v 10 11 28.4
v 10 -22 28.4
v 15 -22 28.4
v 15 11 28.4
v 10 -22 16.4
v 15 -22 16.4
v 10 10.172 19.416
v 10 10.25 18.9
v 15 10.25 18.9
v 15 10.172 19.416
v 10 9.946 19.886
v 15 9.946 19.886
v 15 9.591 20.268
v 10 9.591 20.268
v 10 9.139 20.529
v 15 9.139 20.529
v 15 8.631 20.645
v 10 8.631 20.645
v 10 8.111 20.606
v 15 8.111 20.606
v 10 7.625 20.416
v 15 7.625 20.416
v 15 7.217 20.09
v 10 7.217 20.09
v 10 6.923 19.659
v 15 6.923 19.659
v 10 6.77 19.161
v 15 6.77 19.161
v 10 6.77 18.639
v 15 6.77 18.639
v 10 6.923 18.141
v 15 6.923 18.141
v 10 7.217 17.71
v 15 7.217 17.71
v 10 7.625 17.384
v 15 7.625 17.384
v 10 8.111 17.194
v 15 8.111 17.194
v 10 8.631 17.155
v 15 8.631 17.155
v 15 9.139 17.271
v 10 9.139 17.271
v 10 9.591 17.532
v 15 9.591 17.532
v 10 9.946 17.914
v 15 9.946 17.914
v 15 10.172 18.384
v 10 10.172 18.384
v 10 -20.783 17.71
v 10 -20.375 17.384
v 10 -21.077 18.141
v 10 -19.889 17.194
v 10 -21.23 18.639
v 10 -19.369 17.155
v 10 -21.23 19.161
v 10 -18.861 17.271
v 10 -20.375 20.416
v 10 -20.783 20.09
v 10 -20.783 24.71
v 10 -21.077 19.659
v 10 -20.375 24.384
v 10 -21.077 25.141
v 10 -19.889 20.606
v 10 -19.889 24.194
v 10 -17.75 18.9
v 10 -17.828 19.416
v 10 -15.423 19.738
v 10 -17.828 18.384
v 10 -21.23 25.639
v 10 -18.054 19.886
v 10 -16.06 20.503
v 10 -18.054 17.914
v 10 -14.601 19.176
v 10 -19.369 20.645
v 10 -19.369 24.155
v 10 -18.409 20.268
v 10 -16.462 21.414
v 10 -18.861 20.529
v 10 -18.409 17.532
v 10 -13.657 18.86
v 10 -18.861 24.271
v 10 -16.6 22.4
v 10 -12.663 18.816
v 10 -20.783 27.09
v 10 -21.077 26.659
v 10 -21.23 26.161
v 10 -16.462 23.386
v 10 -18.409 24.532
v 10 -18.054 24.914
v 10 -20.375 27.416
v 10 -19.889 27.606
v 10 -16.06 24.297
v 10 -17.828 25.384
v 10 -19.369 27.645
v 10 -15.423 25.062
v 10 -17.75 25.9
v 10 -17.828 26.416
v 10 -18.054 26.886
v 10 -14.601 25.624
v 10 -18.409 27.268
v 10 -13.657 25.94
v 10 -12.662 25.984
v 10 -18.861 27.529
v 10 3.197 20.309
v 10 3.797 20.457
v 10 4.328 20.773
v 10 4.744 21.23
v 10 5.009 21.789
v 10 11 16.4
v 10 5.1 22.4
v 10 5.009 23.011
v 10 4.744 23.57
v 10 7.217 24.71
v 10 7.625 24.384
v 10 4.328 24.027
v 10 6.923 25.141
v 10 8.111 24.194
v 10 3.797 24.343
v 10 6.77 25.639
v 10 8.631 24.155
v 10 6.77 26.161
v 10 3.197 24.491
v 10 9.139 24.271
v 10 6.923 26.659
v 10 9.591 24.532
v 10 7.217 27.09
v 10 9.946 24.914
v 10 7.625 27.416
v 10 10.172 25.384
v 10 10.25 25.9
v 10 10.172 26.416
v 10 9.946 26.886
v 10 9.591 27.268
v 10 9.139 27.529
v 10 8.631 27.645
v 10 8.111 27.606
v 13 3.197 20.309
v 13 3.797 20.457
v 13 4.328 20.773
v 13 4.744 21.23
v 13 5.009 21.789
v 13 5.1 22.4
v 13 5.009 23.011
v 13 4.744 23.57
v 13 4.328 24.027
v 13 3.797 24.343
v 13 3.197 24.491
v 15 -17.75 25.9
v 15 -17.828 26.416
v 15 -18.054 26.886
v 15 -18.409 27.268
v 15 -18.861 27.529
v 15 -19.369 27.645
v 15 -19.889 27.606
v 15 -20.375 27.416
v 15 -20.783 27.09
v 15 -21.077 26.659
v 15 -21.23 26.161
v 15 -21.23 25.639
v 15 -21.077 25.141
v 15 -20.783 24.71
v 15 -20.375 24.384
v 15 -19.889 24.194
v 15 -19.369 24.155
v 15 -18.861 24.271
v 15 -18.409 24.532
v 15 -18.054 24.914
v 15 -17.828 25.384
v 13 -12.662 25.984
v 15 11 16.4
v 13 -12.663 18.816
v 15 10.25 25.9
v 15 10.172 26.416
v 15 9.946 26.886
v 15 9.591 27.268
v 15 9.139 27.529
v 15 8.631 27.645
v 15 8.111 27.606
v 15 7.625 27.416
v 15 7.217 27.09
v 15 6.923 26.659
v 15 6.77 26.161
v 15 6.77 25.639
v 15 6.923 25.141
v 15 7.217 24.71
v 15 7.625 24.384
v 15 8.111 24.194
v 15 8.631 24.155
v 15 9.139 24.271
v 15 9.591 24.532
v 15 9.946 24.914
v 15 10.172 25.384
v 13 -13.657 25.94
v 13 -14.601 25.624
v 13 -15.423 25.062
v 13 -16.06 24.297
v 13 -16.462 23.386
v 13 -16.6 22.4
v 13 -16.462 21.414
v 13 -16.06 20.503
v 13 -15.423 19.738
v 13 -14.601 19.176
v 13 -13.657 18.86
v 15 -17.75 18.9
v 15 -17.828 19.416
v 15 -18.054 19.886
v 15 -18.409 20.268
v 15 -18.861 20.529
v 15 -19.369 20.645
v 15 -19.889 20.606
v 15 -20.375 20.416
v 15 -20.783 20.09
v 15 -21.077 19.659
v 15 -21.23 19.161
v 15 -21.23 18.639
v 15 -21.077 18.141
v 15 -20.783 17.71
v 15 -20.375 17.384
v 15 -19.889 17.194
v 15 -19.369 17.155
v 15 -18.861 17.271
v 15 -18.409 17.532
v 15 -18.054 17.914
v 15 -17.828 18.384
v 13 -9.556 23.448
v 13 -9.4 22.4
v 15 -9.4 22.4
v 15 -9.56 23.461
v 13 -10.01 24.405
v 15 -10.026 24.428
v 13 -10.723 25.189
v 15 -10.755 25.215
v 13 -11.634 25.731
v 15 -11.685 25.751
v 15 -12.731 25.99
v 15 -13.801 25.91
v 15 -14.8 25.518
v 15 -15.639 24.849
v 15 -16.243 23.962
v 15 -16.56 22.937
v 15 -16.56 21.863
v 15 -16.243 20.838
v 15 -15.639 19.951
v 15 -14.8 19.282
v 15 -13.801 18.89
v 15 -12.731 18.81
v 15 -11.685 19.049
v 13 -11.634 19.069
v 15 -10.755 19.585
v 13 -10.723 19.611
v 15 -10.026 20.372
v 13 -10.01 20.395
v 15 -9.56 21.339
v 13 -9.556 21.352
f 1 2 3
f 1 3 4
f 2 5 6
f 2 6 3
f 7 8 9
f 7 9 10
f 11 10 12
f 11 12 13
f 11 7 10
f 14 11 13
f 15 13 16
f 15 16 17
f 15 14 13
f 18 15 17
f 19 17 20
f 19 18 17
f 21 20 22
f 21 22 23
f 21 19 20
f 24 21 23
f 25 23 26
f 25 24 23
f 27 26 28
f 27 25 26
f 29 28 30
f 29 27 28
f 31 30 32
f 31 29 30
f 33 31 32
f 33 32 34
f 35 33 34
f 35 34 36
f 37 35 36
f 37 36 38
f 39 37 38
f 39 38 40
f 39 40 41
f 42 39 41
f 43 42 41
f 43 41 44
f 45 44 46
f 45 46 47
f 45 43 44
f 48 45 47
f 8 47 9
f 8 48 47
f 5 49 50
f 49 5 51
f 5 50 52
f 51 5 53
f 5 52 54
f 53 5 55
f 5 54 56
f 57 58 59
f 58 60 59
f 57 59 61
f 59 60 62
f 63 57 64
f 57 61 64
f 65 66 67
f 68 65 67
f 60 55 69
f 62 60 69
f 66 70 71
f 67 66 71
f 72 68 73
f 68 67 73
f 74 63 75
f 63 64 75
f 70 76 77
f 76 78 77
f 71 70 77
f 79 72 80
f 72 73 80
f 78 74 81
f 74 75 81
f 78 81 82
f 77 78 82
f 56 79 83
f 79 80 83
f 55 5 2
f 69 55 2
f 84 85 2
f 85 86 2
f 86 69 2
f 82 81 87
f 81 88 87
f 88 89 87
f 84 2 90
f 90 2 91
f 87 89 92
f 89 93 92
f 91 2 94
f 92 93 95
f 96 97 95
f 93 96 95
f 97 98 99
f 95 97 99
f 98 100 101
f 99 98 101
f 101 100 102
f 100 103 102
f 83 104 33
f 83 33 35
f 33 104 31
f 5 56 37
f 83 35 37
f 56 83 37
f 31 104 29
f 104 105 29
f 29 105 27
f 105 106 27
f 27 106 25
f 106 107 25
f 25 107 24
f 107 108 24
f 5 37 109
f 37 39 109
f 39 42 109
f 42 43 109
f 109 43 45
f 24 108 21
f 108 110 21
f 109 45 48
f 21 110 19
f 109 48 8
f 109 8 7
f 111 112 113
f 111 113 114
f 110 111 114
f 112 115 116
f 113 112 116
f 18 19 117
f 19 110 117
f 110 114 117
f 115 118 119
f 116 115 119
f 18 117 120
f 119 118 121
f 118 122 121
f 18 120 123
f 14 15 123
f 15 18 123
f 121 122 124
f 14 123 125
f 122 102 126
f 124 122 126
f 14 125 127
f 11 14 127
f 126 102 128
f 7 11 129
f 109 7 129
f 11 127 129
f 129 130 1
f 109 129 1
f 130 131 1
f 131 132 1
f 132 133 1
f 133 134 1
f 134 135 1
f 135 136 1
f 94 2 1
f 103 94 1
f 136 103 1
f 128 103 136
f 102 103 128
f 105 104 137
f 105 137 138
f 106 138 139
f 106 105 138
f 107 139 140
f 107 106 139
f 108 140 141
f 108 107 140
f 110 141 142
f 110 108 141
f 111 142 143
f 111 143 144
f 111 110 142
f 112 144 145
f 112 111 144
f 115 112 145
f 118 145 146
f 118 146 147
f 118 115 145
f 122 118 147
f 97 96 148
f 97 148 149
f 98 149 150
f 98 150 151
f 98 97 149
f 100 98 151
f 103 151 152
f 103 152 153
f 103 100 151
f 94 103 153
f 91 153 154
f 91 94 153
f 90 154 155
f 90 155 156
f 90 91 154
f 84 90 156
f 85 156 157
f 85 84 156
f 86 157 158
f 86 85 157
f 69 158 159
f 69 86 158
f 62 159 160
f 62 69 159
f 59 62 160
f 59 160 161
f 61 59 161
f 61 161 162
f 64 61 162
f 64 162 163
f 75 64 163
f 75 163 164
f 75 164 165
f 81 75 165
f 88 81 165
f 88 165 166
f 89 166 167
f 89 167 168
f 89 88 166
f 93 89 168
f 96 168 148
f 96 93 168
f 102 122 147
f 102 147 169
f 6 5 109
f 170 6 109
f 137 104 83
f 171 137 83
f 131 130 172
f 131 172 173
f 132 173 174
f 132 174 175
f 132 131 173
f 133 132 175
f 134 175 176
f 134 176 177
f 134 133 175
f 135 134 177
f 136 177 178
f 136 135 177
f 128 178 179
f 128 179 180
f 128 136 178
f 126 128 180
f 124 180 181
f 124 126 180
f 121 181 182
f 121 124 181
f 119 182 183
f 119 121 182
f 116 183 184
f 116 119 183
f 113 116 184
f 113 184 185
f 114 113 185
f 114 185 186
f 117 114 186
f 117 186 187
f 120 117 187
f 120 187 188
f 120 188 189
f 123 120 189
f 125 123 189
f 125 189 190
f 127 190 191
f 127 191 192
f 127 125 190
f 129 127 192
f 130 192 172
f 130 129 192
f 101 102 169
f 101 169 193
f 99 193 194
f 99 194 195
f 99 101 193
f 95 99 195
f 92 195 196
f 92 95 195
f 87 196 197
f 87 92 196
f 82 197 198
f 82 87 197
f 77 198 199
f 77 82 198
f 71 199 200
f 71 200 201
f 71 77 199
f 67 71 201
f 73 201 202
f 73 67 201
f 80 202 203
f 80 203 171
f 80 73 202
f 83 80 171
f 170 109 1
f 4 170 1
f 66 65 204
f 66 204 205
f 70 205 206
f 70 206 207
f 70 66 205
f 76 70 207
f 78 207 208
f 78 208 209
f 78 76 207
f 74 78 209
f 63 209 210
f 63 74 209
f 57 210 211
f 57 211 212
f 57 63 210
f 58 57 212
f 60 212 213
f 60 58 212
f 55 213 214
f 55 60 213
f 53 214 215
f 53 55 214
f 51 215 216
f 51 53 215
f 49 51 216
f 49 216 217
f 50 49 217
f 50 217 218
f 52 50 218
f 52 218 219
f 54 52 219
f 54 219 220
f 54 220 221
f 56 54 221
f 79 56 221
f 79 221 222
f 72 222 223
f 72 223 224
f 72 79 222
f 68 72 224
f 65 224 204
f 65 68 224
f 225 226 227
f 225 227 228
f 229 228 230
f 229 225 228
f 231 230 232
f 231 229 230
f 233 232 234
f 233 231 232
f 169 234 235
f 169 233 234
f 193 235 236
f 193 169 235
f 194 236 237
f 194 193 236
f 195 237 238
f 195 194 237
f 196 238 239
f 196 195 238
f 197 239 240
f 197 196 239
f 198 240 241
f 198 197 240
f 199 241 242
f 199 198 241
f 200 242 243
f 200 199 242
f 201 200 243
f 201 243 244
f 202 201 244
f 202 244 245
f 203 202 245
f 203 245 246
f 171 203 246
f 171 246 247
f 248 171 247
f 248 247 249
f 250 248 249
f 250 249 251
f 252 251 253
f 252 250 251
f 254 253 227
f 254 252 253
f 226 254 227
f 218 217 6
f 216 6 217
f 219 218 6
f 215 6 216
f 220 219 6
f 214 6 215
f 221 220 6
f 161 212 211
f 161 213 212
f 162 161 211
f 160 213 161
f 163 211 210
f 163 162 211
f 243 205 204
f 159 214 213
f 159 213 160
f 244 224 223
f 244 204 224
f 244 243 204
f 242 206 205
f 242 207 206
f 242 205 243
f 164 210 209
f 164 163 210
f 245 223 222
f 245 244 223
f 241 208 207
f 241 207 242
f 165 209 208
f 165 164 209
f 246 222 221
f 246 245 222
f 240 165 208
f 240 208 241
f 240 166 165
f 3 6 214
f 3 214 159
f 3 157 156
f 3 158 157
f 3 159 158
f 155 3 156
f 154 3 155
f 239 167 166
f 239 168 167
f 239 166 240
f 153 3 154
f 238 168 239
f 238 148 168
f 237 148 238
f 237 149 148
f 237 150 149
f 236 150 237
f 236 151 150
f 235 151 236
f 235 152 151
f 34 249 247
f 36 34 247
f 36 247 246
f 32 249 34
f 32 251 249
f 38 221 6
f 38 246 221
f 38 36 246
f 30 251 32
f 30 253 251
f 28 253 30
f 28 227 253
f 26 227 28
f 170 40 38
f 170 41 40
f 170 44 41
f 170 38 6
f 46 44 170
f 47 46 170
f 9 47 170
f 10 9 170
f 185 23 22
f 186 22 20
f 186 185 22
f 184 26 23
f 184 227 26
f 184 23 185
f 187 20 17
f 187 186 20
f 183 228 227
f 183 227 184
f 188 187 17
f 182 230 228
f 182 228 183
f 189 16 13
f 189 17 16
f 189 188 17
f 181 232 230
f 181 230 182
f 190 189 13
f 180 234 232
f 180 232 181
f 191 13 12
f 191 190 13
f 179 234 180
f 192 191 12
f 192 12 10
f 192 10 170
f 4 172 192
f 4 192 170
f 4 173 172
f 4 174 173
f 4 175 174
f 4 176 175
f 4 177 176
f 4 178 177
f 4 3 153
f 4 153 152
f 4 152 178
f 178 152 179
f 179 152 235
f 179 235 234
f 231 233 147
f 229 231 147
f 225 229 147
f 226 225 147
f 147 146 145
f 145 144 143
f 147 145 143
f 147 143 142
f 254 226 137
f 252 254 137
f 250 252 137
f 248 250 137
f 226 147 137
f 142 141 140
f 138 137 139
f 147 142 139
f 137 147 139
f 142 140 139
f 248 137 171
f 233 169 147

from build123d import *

# Parameters (mm, degrees)
SKETCH077_W     = 33
SKETCH077_H     = 12
SKETCH077_R     = 1.75
PAD042_DEPTH    = 5
POCKET029_DEPTH = 3
SKETCH079_R     = 3.6
POCKET030_DEPTH = 5


with BuildPart() as part:
    # Sketch077 → Pad042 (new body)
    with BuildSketch(Plane.YZ):
        with Locations((16.5, 6)):
            Rectangle(SKETCH077_W, SKETCH077_H)
        with Locations((2.5, 9.5)):
            Circle(SKETCH077_R, mode=Mode.SUBTRACT)
        with Locations((2.5, 2.5)):
            Circle(SKETCH077_R, mode=Mode.SUBTRACT)
        with Locations((30.5, 9.5)):
            Circle(SKETCH077_R, mode=Mode.SUBTRACT)
        with Locations((30.5, 2.5)):
            Circle(SKETCH077_R, mode=Mode.SUBTRACT)
    extrude(amount=PAD042_DEPTH)

    # Sketch078 → Pocket029 (cut)
    with BuildSketch(Plane(origin=(0, 9, 6), x_dir=(0, 0, -1), z_dir=(1, 0, 0))):
        with BuildLine():
            ThreePointArc((-3.584145, 0.3375), (0, -3.6), (3.584145, 0.3375))
            Line((2.090751, 16.196875), (3.584145, 0.3375))
            ThreePointArc((2.090751, 16.196875), (0, 18.1), (-2.090751, 16.196875))
            Line((-2.090751, 16.196875), (-3.584145, 0.3375))
        make_face()
    extrude(amount=POCKET029_DEPTH, mode=Mode.SUBTRACT)

    # Sketch079 → Pocket030 (cut)
    with BuildSketch(Plane(origin=(0, 9, 6), x_dir=(0, 1, 0), z_dir=(1, 0, 0))):
        Circle(SKETCH079_R)
    extrude(amount=POCKET030_DEPTH, mode=Mode.SUBTRACT)


with BuildPart() as part_1:
    # Body012 placement: moved
    add(part.part.moved(Location((10, -22, 16.4))))


solid = part_1.part
